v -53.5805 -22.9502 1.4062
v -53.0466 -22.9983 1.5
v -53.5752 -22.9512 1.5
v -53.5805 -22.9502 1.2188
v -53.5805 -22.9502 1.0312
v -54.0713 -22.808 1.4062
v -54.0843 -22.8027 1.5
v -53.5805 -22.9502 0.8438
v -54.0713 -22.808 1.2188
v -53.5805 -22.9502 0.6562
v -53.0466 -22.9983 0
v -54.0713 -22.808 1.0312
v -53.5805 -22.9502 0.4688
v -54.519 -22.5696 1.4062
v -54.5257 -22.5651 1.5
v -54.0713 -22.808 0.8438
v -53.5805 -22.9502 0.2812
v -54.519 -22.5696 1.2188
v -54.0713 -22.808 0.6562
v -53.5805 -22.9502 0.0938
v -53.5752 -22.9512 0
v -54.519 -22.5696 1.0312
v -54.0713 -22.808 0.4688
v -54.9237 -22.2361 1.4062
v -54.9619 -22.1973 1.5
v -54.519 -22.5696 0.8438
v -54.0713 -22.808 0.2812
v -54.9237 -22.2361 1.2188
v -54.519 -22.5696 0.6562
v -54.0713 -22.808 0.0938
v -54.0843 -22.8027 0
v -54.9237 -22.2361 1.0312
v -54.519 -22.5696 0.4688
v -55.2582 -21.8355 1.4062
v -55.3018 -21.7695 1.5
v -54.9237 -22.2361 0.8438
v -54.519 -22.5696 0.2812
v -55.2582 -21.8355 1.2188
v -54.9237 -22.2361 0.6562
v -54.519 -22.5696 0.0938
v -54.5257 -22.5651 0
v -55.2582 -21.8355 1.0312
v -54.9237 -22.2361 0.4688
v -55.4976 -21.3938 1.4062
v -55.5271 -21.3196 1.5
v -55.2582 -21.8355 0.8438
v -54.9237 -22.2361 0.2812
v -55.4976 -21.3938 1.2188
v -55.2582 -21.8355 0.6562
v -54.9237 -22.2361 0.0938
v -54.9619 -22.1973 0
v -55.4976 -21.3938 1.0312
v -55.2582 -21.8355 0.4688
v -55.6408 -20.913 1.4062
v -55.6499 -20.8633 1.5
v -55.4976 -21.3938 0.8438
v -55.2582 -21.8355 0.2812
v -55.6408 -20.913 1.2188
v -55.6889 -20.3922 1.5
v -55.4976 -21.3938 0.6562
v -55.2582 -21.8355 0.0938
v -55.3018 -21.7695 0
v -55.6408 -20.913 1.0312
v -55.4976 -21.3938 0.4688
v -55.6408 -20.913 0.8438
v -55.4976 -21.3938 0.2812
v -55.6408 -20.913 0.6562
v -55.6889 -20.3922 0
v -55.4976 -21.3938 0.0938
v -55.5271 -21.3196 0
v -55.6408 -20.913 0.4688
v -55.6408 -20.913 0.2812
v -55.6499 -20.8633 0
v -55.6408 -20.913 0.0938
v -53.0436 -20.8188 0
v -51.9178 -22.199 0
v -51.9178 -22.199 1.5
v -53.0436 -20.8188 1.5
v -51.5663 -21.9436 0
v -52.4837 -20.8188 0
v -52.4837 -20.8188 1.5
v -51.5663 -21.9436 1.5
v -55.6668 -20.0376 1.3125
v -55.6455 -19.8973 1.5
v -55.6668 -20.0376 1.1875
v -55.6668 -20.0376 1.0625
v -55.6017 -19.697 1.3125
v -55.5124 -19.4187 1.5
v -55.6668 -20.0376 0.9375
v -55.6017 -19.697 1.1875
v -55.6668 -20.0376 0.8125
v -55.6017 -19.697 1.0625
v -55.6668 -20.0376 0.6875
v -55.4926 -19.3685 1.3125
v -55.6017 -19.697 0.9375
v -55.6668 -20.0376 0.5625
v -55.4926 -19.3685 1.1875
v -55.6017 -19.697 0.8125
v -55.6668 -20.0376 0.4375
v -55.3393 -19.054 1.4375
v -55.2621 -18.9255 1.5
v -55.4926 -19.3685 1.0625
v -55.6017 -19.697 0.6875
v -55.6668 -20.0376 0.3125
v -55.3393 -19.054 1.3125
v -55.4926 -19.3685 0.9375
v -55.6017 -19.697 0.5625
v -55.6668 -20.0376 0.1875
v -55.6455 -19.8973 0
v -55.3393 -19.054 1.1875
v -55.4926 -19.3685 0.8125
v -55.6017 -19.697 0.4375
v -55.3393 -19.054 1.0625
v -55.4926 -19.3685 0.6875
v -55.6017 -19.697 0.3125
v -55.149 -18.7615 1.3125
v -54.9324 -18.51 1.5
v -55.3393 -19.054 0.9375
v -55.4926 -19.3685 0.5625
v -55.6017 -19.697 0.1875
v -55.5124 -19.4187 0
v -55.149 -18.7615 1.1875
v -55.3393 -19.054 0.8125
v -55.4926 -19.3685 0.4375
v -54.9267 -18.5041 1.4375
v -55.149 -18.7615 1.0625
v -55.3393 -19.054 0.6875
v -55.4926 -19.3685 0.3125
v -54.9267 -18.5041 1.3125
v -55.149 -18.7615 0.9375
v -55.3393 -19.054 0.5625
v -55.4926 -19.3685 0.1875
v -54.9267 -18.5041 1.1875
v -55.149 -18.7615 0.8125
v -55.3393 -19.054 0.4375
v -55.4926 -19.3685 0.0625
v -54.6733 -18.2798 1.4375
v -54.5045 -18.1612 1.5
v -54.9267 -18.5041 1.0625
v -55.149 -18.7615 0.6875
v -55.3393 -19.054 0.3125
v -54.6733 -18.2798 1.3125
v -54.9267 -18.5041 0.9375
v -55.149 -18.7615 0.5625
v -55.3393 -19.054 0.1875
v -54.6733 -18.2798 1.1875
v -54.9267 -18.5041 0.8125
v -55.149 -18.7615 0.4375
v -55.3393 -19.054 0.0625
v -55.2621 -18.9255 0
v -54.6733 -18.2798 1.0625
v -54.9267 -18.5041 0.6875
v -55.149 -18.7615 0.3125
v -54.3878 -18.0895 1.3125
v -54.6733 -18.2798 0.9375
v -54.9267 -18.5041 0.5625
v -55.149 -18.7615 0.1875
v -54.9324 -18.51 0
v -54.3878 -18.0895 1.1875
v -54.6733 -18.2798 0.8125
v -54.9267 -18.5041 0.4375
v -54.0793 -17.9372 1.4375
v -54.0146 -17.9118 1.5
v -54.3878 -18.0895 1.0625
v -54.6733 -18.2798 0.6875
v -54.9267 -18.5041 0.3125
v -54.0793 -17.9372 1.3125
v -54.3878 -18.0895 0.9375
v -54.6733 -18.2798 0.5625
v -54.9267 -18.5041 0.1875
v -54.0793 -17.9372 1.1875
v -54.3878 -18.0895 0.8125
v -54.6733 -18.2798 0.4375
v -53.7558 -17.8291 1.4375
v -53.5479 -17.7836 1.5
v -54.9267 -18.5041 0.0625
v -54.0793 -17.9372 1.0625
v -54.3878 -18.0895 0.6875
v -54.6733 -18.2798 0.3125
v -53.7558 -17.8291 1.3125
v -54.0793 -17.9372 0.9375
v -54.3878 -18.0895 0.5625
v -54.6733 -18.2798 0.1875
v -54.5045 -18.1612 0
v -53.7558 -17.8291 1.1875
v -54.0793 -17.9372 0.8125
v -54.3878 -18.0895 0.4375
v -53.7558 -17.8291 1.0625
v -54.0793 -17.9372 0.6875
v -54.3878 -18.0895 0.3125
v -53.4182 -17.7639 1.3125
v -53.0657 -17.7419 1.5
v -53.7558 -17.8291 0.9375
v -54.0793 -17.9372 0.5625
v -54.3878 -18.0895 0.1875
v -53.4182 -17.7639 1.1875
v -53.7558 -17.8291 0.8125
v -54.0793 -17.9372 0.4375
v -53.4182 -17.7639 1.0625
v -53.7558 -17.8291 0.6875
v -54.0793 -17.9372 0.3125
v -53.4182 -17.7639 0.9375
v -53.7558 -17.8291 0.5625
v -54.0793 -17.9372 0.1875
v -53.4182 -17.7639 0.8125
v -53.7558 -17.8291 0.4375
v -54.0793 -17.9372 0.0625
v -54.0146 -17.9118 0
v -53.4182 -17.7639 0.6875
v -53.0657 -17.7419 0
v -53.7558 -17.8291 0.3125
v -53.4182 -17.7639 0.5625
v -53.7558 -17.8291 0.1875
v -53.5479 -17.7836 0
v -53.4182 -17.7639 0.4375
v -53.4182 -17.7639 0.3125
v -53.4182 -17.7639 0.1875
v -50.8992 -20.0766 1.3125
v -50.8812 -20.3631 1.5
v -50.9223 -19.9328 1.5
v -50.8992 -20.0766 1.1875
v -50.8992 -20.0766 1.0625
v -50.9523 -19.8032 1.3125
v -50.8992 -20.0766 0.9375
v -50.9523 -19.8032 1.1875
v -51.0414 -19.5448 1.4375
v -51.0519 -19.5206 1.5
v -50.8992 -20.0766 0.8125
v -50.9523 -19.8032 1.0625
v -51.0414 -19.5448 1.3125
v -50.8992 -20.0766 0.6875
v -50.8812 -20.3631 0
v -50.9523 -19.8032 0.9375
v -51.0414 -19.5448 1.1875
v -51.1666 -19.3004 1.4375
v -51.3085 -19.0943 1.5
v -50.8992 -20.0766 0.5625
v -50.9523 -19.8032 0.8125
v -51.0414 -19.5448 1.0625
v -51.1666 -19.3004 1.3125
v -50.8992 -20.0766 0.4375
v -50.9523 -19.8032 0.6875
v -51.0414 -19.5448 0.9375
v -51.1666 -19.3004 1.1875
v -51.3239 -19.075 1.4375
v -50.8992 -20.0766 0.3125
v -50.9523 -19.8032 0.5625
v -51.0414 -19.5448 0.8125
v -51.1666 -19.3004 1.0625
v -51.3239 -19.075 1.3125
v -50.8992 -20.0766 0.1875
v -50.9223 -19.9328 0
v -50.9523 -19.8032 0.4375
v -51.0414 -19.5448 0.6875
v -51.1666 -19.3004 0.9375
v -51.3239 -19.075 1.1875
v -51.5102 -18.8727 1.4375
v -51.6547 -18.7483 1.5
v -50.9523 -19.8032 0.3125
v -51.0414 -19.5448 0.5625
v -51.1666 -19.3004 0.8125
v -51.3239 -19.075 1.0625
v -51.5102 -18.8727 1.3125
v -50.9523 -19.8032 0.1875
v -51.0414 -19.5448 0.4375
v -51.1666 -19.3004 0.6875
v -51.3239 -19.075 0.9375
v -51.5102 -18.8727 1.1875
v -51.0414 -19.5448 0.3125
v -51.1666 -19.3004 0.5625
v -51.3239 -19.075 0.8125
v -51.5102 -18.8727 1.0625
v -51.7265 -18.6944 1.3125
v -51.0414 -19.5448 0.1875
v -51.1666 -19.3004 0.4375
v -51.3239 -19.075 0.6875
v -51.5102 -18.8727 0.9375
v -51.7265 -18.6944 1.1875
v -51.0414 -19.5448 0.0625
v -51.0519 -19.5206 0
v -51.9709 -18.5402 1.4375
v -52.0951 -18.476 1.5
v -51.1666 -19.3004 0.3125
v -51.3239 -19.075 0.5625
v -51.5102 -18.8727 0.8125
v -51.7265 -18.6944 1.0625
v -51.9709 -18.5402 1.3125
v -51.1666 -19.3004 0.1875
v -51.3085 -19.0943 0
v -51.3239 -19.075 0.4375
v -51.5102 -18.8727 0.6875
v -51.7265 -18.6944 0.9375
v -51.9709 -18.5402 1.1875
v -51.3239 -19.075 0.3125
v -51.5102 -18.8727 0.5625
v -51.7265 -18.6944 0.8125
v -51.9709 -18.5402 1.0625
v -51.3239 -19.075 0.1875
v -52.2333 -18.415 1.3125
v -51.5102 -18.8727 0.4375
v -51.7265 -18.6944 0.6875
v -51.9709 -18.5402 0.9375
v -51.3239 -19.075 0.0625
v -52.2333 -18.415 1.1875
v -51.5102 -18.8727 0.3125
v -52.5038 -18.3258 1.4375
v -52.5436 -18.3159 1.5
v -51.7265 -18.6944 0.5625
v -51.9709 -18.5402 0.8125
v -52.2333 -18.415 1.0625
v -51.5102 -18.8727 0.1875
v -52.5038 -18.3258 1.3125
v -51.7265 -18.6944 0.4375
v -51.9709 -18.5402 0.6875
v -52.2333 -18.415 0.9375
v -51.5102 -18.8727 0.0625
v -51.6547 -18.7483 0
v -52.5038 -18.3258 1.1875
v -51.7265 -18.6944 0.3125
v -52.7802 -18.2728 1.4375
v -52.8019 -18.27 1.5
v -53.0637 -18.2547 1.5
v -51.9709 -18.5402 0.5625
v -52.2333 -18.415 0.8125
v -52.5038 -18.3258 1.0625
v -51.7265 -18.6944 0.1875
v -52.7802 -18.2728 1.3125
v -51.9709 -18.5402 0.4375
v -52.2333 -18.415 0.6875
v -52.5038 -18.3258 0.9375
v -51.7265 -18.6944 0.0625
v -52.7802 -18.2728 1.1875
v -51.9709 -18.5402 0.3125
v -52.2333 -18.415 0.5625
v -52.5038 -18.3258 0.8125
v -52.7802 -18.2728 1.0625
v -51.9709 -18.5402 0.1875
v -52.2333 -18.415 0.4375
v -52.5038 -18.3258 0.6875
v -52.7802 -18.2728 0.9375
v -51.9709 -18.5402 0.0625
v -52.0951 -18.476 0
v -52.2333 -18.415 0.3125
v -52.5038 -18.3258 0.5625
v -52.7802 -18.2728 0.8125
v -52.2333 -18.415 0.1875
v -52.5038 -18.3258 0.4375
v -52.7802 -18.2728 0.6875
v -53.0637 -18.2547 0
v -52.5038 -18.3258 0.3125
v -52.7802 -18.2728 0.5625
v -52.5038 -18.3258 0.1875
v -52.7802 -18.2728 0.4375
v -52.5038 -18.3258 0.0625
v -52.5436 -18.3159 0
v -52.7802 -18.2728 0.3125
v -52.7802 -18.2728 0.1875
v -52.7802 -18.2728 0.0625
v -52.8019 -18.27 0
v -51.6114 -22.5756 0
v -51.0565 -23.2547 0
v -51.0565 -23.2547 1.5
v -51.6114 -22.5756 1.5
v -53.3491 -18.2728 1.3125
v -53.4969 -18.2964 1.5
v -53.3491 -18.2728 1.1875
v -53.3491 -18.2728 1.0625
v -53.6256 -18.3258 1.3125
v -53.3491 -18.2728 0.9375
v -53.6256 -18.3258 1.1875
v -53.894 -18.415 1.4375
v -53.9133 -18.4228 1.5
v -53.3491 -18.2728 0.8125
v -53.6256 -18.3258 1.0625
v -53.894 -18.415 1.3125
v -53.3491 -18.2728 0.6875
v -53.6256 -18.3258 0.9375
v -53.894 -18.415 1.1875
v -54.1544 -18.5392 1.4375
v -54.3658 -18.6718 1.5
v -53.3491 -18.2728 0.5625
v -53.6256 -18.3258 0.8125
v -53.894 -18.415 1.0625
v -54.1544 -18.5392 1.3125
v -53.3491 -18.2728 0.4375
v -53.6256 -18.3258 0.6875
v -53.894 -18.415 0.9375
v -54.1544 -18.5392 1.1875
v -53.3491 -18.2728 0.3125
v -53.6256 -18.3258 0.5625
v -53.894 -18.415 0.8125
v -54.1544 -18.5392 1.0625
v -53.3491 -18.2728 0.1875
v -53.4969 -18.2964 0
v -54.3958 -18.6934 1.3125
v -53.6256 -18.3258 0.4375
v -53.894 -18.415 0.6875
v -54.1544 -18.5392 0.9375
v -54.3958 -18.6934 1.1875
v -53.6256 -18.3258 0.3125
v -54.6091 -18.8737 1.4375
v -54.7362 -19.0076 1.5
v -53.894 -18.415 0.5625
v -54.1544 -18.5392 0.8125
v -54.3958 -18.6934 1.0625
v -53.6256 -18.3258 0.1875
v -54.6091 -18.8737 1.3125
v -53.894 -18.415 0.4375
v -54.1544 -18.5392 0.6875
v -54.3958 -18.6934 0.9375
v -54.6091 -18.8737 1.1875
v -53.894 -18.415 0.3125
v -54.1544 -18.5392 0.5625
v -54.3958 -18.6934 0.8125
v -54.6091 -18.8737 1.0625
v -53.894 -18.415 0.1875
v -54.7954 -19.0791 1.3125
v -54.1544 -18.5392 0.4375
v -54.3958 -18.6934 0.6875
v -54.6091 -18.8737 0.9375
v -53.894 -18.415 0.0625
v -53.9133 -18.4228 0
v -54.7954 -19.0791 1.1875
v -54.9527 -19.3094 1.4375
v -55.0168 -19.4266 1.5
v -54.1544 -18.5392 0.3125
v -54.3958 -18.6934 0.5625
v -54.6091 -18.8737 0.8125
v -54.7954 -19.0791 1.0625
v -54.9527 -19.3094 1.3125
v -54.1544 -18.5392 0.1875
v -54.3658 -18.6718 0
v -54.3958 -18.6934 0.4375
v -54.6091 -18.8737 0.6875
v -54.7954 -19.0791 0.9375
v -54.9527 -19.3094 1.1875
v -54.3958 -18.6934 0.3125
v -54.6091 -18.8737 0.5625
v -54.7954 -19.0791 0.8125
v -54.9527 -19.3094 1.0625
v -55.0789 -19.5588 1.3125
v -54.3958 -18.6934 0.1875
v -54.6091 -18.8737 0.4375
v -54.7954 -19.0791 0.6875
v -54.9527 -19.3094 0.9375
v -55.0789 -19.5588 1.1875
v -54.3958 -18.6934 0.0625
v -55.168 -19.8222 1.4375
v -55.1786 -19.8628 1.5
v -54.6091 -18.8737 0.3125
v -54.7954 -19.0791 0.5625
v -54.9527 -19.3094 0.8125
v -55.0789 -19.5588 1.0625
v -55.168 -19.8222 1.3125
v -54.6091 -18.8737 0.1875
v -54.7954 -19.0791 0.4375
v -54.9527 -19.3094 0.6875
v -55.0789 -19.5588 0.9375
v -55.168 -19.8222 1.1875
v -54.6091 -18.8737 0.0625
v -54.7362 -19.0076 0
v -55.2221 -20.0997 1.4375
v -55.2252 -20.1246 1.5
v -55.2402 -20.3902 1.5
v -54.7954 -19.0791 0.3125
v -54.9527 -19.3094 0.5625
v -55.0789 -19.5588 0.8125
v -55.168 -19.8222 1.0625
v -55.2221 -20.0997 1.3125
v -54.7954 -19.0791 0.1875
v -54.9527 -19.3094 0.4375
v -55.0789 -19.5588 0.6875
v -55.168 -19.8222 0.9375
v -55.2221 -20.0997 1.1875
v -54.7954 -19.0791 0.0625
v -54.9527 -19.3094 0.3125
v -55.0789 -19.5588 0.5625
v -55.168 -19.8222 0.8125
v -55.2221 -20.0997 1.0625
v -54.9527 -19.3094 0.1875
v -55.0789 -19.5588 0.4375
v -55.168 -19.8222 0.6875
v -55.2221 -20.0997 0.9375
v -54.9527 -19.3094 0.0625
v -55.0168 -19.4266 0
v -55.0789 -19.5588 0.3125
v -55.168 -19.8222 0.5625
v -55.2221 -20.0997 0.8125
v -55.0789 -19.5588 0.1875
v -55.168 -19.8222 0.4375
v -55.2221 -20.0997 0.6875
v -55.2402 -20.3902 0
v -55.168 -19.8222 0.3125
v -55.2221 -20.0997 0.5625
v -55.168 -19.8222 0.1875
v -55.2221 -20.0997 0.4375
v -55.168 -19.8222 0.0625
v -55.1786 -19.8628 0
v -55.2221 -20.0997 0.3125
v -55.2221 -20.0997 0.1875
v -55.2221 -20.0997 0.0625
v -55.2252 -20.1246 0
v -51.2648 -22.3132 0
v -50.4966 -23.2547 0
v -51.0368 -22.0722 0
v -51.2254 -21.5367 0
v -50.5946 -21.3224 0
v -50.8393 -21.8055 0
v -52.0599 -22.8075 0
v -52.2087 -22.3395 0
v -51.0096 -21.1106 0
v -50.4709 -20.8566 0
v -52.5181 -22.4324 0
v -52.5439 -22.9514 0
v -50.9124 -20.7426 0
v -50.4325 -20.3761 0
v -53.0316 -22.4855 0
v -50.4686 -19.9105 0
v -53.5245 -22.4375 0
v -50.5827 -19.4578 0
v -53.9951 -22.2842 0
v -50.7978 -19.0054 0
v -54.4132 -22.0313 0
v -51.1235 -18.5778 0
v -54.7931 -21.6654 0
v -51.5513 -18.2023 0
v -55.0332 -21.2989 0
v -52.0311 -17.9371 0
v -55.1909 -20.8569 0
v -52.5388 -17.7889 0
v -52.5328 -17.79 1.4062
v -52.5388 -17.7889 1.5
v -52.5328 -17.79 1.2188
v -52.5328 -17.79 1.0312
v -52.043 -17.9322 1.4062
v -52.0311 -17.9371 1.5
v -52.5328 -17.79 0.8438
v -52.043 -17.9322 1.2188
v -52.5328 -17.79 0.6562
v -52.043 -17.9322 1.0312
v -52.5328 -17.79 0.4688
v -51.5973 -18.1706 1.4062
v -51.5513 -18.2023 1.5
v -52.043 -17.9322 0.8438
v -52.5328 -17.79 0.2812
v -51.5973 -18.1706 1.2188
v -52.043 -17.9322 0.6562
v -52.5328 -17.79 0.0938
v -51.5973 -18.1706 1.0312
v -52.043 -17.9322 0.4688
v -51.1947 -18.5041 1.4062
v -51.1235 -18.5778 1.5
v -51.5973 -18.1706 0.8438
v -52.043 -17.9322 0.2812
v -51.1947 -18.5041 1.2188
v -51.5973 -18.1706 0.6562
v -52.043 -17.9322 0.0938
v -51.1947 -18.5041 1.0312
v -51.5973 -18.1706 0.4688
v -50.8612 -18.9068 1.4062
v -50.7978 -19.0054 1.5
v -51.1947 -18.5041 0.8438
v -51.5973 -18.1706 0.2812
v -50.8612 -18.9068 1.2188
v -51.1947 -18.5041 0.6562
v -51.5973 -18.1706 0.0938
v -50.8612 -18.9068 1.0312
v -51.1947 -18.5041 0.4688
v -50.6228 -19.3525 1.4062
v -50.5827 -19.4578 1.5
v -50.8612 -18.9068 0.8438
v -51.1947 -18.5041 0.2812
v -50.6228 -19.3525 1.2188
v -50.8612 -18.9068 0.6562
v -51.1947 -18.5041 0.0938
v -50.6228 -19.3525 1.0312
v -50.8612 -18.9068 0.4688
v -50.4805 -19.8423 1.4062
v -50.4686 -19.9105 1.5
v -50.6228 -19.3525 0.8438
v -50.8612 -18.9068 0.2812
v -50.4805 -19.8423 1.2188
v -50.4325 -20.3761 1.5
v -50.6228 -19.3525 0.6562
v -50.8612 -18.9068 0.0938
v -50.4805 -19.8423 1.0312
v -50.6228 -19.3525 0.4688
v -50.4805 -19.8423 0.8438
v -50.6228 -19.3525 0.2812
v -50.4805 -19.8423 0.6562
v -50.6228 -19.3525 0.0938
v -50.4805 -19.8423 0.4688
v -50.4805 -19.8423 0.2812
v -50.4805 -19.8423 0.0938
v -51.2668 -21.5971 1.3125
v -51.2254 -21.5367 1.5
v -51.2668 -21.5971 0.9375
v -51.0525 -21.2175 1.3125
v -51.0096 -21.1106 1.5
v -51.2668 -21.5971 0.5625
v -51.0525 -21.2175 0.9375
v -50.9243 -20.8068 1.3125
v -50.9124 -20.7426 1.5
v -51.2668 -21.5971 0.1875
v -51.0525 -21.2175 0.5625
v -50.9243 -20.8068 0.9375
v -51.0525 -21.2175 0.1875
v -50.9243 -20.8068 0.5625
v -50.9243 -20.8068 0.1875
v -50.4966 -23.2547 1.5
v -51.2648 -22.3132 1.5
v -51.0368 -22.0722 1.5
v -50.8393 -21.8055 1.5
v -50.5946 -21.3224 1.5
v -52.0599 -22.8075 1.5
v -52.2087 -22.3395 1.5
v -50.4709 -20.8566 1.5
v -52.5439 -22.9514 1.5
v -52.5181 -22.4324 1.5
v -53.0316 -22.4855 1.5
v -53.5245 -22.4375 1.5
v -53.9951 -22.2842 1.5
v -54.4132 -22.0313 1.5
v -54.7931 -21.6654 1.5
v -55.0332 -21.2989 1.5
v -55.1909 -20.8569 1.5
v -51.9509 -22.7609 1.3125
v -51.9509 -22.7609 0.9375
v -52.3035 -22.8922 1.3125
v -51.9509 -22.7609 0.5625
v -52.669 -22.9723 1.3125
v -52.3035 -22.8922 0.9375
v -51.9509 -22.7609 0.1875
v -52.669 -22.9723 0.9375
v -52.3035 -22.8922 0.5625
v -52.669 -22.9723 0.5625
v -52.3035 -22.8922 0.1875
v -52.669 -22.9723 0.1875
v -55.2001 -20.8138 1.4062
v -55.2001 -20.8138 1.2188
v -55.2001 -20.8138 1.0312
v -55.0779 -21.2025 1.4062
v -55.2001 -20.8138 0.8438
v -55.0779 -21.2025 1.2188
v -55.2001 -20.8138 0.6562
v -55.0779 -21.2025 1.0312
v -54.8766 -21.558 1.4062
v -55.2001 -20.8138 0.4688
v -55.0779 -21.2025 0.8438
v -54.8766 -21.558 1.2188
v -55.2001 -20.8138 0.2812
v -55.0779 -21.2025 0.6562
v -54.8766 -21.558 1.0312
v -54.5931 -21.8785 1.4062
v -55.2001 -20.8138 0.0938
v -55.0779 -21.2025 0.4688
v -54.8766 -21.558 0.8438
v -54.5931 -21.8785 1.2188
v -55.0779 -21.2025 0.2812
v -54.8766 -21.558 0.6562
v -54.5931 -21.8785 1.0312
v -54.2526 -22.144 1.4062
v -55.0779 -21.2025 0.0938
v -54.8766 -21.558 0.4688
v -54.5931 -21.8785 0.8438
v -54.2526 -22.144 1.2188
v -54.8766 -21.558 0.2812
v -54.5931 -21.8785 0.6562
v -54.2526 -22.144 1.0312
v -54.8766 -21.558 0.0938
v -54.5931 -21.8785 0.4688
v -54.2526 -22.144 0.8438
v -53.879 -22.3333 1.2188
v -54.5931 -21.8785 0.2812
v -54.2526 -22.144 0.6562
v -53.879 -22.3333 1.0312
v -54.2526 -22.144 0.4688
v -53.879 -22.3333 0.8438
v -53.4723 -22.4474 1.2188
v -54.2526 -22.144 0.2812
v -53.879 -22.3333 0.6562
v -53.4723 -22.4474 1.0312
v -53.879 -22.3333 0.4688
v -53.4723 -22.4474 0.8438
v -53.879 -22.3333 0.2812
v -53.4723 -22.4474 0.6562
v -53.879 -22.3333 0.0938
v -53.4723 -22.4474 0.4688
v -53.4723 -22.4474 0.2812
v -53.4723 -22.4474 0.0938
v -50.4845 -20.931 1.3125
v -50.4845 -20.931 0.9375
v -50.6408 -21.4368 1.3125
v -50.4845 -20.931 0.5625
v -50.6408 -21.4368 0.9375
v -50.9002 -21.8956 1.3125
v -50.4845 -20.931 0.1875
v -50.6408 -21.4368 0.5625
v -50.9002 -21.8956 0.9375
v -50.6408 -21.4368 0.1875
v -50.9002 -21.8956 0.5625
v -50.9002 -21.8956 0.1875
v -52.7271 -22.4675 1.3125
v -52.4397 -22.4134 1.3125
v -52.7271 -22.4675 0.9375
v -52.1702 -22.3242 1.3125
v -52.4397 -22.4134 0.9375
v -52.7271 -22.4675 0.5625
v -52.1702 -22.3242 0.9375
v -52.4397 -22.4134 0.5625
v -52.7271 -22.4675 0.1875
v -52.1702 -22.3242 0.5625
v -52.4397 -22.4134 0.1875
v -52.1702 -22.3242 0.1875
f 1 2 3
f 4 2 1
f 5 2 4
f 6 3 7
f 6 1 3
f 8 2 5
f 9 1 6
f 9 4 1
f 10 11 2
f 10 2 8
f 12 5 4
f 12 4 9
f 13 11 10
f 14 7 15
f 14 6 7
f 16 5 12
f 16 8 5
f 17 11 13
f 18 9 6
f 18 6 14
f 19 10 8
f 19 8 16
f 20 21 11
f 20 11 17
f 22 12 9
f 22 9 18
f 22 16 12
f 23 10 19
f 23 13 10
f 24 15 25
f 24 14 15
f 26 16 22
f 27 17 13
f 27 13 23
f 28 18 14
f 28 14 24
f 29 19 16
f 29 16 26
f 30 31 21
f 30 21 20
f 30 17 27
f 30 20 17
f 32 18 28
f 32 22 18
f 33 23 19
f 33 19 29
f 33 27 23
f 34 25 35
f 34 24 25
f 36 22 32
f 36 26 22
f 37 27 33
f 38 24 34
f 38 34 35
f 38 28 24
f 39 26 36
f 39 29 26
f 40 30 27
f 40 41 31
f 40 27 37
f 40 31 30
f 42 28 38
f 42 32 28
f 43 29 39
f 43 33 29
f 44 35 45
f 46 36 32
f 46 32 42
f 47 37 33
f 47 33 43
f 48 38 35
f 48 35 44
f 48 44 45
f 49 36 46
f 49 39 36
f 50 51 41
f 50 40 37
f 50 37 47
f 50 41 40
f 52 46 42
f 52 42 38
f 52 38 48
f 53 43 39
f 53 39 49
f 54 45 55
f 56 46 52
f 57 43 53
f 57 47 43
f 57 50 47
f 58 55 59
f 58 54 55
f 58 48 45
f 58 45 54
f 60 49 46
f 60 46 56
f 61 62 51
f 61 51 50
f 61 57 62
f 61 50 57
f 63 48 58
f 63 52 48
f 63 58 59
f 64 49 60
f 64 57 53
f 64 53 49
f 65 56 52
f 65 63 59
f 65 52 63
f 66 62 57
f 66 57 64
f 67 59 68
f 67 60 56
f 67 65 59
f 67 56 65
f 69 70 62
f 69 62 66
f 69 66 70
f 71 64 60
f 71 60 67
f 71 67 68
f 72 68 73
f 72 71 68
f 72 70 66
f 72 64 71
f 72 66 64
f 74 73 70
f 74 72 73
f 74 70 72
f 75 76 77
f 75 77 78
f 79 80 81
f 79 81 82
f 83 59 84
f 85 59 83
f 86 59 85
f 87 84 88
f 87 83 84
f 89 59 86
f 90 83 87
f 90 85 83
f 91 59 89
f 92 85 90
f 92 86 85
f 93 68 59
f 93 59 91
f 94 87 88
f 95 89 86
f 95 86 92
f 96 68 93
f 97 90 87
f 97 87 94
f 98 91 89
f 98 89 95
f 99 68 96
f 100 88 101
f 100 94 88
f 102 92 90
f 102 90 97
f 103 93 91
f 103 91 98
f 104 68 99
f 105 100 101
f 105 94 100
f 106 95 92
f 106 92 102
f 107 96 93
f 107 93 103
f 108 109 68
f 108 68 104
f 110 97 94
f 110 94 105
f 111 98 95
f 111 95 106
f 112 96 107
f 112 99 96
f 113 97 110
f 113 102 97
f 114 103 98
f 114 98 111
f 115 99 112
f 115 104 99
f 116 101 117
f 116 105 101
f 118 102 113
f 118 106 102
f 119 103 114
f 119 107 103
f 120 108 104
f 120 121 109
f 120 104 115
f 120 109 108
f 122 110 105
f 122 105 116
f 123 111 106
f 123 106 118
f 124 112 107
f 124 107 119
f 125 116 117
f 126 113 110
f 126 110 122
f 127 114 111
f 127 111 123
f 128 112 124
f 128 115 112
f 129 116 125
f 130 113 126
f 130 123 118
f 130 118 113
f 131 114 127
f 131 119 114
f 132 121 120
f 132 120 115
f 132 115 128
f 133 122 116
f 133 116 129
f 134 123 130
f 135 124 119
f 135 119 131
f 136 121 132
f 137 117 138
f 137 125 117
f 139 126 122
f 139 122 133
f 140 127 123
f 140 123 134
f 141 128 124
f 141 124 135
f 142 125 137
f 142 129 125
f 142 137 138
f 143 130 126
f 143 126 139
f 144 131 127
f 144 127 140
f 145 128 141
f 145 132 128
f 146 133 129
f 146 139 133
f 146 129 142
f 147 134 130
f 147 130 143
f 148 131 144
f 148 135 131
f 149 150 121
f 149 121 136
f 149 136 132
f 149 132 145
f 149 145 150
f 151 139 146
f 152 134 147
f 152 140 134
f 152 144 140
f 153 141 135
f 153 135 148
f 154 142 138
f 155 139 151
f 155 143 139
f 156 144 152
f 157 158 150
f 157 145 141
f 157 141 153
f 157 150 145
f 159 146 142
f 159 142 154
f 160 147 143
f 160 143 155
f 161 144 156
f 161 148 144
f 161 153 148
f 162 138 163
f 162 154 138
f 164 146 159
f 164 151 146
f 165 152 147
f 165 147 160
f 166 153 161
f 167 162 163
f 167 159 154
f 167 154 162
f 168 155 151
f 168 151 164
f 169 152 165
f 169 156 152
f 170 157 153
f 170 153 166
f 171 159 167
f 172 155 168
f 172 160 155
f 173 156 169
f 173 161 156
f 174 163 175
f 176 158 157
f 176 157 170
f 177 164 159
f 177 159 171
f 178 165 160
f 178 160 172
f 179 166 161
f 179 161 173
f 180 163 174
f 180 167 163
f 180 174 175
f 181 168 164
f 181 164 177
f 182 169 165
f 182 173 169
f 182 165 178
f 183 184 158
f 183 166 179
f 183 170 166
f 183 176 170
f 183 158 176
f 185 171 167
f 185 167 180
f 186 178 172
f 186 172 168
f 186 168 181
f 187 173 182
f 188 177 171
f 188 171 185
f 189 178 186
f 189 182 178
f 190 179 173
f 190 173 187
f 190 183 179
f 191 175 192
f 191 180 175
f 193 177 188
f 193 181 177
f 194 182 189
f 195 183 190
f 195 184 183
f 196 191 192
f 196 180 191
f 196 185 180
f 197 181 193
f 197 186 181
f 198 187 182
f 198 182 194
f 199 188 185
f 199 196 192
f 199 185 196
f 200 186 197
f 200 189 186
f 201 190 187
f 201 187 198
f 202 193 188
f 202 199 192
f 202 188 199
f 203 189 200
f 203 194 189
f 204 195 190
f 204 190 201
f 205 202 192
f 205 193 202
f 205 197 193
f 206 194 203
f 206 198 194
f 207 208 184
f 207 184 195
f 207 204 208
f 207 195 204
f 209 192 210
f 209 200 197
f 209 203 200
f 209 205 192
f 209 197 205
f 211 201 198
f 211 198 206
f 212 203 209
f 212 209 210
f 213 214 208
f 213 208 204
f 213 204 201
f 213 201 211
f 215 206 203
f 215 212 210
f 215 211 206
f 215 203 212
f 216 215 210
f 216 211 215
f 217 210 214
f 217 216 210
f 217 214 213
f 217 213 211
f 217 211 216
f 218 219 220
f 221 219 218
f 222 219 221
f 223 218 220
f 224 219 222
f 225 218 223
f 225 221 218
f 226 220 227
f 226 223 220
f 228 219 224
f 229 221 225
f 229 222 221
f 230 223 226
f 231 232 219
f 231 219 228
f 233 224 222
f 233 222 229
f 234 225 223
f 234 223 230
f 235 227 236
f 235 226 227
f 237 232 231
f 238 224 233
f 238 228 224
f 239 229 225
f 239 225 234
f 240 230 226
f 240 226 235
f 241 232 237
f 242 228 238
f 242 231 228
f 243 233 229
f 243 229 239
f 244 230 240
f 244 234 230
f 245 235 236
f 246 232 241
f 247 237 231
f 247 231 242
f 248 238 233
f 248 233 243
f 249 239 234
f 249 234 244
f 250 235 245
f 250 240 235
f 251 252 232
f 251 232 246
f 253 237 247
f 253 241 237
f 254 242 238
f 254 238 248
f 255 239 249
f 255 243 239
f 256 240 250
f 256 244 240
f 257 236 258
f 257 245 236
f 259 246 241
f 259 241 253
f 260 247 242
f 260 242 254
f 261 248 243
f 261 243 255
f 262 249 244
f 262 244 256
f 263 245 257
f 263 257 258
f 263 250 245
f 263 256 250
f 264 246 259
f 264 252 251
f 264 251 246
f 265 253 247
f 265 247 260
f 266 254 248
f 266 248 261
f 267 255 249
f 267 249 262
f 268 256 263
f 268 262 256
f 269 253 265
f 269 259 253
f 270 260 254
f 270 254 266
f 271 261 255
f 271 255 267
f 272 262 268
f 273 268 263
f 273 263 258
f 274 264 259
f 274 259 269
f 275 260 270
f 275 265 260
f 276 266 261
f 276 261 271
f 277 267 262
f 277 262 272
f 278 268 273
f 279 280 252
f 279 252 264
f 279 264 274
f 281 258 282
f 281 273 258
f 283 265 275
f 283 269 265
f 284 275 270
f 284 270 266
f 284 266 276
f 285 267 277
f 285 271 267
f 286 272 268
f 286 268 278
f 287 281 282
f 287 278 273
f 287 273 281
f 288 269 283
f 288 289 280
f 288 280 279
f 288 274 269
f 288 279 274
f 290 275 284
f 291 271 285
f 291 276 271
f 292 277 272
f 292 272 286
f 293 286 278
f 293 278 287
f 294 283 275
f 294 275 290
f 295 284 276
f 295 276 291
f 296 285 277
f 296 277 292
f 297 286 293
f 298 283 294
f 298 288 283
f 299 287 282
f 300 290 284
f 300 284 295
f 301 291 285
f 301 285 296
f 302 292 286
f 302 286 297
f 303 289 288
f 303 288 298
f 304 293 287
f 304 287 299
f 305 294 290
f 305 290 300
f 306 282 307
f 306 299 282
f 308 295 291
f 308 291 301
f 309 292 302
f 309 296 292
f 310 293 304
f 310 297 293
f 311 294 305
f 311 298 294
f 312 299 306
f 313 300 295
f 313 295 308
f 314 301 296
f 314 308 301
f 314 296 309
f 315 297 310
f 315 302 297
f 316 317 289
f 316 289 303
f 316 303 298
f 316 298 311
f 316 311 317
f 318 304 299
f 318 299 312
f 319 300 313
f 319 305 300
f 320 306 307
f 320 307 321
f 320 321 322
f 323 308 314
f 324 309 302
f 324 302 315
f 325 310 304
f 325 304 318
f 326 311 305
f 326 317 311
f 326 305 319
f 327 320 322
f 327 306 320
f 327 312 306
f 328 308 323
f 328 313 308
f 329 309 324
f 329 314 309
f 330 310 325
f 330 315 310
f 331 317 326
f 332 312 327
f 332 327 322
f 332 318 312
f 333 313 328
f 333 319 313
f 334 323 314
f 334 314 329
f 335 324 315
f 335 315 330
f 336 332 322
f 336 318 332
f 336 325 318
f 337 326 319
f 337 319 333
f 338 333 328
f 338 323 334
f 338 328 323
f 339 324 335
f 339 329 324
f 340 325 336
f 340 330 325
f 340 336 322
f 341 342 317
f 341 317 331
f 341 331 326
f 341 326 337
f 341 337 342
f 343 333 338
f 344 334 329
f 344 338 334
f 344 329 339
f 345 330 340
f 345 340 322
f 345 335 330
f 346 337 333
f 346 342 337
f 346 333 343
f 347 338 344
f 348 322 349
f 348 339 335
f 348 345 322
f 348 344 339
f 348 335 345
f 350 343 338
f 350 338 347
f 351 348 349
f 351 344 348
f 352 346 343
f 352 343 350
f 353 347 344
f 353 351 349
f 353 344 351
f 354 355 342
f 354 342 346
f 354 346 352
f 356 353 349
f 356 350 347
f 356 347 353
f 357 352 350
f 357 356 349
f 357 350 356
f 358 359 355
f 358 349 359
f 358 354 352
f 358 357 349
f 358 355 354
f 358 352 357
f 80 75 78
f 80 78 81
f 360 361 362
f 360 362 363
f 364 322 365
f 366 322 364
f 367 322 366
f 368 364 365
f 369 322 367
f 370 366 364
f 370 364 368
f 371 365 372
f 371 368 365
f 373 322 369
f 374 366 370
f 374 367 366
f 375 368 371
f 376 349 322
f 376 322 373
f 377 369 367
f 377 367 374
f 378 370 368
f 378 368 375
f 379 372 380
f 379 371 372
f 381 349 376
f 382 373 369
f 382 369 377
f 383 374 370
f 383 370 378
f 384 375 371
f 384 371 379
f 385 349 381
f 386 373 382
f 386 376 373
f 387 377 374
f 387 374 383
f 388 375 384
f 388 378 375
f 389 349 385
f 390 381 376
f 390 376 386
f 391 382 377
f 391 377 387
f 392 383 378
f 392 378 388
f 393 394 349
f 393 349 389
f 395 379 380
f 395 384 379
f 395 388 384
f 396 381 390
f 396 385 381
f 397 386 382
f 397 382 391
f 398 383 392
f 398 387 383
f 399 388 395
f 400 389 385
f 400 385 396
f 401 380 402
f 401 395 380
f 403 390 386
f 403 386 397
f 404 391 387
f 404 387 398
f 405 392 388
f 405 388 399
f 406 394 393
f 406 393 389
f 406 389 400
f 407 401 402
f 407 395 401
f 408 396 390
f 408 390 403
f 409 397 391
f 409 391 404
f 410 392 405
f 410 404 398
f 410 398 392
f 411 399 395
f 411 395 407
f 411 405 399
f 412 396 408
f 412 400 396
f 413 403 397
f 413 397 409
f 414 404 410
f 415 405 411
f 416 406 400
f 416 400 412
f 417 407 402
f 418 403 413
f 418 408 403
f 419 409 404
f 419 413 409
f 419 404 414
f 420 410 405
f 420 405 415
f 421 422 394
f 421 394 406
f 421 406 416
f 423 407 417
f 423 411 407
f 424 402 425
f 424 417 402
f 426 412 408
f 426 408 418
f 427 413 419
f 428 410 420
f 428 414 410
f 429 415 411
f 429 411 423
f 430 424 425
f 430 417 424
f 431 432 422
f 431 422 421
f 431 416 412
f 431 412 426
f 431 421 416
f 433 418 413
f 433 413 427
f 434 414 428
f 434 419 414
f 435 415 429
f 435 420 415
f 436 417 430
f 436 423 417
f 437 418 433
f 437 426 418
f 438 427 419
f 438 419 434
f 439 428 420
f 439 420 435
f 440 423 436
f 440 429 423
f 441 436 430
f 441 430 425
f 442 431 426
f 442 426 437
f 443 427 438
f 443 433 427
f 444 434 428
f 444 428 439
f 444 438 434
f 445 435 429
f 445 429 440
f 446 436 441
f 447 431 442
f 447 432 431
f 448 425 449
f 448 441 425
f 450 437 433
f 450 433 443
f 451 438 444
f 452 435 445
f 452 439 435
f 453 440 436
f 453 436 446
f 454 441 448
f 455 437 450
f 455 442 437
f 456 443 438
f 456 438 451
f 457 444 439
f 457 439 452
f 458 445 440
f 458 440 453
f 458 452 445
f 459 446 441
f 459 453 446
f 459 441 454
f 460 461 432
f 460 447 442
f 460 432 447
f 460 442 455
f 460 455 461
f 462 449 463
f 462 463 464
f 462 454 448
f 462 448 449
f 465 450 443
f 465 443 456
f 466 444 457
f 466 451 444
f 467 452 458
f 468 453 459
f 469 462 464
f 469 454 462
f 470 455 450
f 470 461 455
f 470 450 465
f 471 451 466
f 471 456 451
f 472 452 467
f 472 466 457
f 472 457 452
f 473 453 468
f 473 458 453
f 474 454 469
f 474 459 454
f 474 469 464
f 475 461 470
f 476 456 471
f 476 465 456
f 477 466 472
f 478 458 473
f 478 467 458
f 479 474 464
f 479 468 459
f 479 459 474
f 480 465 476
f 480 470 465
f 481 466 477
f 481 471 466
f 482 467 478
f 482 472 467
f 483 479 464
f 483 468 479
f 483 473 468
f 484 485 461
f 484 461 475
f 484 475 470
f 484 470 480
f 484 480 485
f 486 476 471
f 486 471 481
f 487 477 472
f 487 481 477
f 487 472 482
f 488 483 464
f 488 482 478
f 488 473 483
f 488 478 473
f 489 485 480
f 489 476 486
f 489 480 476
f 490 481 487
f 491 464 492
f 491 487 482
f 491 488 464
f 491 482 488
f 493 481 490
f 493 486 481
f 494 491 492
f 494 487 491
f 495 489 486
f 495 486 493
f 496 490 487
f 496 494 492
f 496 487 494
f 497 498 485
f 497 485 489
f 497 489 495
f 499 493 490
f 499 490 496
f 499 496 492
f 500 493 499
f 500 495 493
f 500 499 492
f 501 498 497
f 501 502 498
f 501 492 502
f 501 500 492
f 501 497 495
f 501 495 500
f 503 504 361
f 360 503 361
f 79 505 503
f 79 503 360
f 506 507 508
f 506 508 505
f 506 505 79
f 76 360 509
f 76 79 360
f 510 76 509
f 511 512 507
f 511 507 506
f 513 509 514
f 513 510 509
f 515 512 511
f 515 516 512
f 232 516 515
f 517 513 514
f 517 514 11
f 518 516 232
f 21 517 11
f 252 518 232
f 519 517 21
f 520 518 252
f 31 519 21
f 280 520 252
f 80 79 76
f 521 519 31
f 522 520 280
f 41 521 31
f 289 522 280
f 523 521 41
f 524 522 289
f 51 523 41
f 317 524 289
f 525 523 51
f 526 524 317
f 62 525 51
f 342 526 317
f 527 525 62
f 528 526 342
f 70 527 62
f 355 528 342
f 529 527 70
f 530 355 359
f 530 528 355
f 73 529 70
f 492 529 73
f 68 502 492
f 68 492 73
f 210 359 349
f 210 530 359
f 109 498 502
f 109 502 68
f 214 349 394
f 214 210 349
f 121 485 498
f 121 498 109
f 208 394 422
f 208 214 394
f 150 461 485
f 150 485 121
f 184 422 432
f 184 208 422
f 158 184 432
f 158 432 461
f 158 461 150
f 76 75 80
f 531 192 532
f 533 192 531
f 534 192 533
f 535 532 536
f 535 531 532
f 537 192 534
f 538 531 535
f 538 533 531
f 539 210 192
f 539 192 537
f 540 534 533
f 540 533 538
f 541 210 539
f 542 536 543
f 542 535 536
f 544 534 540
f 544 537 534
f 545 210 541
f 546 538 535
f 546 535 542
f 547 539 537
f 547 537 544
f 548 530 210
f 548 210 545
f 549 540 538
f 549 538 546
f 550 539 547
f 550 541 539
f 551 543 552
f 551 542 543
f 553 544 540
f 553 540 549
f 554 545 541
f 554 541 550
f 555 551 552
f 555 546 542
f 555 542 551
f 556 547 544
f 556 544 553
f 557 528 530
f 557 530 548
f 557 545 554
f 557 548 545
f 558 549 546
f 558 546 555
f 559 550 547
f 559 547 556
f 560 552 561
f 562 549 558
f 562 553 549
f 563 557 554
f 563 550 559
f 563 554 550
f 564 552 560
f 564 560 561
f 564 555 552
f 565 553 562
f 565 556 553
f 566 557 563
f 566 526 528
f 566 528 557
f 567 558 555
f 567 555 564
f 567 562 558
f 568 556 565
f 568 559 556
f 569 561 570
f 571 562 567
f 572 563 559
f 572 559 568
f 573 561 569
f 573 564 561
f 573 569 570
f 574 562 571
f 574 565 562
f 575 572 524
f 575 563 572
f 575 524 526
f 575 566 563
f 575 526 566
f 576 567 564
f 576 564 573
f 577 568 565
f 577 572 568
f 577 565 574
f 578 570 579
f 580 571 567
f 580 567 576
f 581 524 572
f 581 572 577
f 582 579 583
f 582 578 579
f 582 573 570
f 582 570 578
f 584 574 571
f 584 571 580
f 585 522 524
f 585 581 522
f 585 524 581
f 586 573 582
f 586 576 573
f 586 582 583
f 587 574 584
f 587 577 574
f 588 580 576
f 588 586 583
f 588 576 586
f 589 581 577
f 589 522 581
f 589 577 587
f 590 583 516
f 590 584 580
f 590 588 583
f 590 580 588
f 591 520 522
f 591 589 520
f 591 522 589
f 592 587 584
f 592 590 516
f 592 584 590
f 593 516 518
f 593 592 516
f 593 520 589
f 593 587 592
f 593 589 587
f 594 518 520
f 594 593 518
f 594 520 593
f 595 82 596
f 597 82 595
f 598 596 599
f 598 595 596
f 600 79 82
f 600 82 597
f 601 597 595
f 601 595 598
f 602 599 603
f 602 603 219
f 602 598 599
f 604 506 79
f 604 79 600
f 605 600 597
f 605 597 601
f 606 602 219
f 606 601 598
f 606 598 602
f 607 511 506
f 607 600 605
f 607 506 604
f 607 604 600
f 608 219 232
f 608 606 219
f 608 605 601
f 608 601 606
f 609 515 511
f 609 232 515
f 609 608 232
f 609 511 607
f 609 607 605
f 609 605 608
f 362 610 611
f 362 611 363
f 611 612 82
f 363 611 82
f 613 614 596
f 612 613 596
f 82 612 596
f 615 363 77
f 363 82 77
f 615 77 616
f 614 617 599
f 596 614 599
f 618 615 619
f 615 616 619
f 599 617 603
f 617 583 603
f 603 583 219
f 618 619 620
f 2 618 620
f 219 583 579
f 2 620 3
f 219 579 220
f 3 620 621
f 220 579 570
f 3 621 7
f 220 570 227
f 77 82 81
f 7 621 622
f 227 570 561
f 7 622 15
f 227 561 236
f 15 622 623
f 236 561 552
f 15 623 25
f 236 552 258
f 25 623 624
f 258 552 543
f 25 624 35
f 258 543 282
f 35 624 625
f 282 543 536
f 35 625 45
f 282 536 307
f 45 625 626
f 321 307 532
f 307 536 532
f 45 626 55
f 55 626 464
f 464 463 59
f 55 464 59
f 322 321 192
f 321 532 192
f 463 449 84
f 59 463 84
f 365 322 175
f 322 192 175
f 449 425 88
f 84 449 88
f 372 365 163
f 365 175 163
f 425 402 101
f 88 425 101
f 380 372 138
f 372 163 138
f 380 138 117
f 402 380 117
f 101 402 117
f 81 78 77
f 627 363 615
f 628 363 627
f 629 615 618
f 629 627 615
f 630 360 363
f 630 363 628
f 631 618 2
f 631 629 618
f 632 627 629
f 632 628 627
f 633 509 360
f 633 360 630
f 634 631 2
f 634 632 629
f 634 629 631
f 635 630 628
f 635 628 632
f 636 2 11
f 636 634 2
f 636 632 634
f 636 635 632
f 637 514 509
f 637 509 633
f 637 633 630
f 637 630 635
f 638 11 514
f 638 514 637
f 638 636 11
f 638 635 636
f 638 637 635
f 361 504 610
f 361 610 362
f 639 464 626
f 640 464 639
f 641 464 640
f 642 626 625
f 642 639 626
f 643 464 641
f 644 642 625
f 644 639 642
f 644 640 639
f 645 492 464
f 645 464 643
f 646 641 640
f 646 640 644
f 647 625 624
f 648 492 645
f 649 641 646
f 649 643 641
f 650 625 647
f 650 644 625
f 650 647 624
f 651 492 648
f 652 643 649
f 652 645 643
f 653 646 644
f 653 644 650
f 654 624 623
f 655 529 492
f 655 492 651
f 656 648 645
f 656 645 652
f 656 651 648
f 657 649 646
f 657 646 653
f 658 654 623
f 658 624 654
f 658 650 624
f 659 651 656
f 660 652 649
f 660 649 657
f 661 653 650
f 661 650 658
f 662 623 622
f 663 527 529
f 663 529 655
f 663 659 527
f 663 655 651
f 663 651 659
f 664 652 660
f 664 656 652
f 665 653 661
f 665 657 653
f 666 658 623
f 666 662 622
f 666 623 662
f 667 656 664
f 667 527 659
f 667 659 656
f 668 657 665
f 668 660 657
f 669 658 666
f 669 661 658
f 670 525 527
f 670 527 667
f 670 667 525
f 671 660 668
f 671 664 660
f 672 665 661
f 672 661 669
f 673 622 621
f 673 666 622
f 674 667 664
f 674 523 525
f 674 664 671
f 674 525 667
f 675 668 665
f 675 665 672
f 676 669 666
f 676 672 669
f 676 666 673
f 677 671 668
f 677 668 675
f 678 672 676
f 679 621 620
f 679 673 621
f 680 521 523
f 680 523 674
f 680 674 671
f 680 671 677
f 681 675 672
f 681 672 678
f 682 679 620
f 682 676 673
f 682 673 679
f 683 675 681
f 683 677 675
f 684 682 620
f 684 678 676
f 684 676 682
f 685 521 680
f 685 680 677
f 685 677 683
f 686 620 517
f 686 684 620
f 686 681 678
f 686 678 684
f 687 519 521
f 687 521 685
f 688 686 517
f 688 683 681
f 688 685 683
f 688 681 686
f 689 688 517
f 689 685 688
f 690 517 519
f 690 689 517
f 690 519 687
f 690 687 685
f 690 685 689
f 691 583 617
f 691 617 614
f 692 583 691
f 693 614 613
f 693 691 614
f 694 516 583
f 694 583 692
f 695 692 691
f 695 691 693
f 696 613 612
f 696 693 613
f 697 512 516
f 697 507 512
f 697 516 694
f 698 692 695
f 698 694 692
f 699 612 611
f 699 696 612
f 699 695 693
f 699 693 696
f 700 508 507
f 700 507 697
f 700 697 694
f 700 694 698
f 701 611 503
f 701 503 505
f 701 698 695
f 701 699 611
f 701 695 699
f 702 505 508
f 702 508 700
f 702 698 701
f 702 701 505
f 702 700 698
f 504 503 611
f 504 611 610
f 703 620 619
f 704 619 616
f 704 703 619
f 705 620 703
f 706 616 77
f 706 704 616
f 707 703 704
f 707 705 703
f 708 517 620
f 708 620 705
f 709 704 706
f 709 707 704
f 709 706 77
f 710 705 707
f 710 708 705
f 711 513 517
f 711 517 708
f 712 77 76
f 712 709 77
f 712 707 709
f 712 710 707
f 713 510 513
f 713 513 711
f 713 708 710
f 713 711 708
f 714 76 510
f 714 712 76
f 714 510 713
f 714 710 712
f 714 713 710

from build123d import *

# Parameters (mm, degrees)
BOSS_EXTRU_1_DEPTH = 1.5


with BuildPart() as part:
    # Esquisse1 → Boss.-Extru.1 (new body)
    with BuildSketch(Plane.XY):
        with BuildLine():
            Line((-51.264797057, -22.313228051), (-50.49656789, -23.254734461))
            Line((-50.49656789, -23.254734461), (-51.056463723, -23.254734461))
            Line((-51.056463723, -23.254734461), (-51.611351544, -22.575647922))
            add(Edge.make_bspline(
                [(-51.611351544, -22.575647922), (-51.667004534, -22.609467545), (-51.77728534, -22.676483804), (-51.949237679, -22.762864043), (-52.124609537, -22.834743668), (-52.303012884, -22.894129346), (-52.484187867, -22.941664096), (-52.669053208, -22.974655224), (-52.856938413, -22.99381276), (-52.983170416, -22.996814657), (-53.046648018, -22.998324204)],
                knots=[0, 0, 0, 0, 1.030216282, 2.041455142, 3.041201647, 4.026904037, 5.014869161, 6.002481075, 6.995518502, 8, 8, 8, 8], degree=3))
            add(Edge.make_bspline(
                [(-53.046648018, -22.998324204), (-53.137591362, -22.99613371), (-53.316540791, -22.991823468), (-53.579355244, -22.954194244), (-53.831617557, -22.896079216), (-54.072824915, -22.811992553), (-54.303240075, -22.704589006), (-54.522755987, -22.572175755), (-54.731484222, -22.416586876), (-54.926343637, -22.238839192), (-55.104522805, -22.045474469), (-55.26086386, -21.838872985), (-55.393795998, -21.622463043), (-55.50127955, -21.395165474), (-55.586582113, -21.158959064), (-55.644713497, -20.911879357), (-55.682341265, -20.655397184), (-55.686676076, -20.480764083), (-55.688875582, -20.392154333)],
                knots=[0, 0, 0, 0, 1.055750571, 2.07740284, 3.077223765, 4.05828044, 5.038417088, 6.02463293, 7.030503776, 8.057169806, 9.083586829, 10.080154041, 11.061747002, 12.027853603, 12.995569715, 13.972756451, 14.971366004, 16, 16, 16, 16], degree=3))
            add(Edge.make_bspline(
                [(-55.688875582, -20.392154333), (-55.688093022, -20.33268107), (-55.686533398, -20.214152396), (-55.668491753, -20.038599293), (-55.641686338, -19.865936249), (-55.603771119, -19.696880782), (-55.554136935, -19.530739956), (-55.494630673, -19.367841379), (-55.422530915, -19.208604795), (-55.341023889, -19.053356113), (-55.250120175, -18.903440884), (-55.151096695, -18.7609928), (-55.043709844, -18.627415695), (-54.928035643, -18.502770687), (-54.804536059, -18.386782246), (-54.674273088, -18.277540391), (-54.534469264, -18.179109035), (-54.388814443, -18.087571822), (-54.236491808, -18.007077518), (-54.080480787, -17.935118183), (-53.919614333, -17.87673225), (-53.755979702, -17.826980362), (-53.588584139, -17.788997635), (-53.417558106, -17.762388722), (-53.243021921, -17.744173055), (-53.125153863, -17.742671581), (-53.065678467, -17.741913948)],
                knots=[0, 0, 0, 0, 1.030721839, 2.054201982, 3.056261636, 4.058906239, 5.055198403, 6.060579377, 7.06322398, 8.083343201, 9.098870418, 10.10084648, 11.0888991, 12.067804703, 13.046436456, 14.024708667, 15.012489976, 16.008294399, 17.005242112, 17.997338632, 18.984424362, 19.969624474, 20.960977749, 21.957320355, 22.969278161, 24, 24, 24, 24], degree=3))
            add(Edge.make_bspline(
                [(-53.065678467, -17.741913948), (-52.974734783, -17.744093445), (-52.796115568, -17.748374118), (-52.533952193, -17.786009017), (-52.282433034, -17.844357249), (-52.041737142, -17.928015386), (-51.812079117, -18.035689413), (-51.593555443, -18.168075975), (-51.385827324, -18.32367516), (-51.191986113, -18.501434748), (-51.014226591, -18.69527595), (-50.85862716, -18.903004041), (-50.726241492, -19.121527831), (-50.61856416, -19.35118542), (-50.534918456, -19.591882956), (-50.476447848, -19.843718418), (-50.438992649, -20.106242587), (-50.434664779, -20.285187594), (-50.432465326, -20.376128692)],
                knots=[0, 0, 0, 0, 1.050672203, 2.063587442, 3.054842799, 4.031180399, 5.003107577, 5.981273811, 6.979214548, 7.998088659, 9.016962771, 10.014903508, 10.993069742, 11.96499692, 12.941334519, 13.932589877, 14.949327797, 16, 16, 16, 16], degree=3))
            add(Edge.make_bspline(
                [(-50.432465326, -20.376128692), (-50.434869066, -20.4707535), (-50.439595885, -20.65682783), (-50.479821925, -20.929686009), (-50.544498334, -21.190329847), (-50.636217294, -21.438588569), (-50.754789182, -21.67441705), (-50.897923277, -21.9001736), (-51.067342928, -22.115842211), (-51.198285863, -22.24673986), (-51.264797057, -22.313228051)],
                knots=[0, 0, 0, 0, 1.045660934, 2.056233022, 3.041853582, 4.009978652, 4.97562384, 5.954545411, 6.961031197, 8, 8, 8, 8], degree=3))
        make_face()
        with BuildLine():
            add(Edge.make_bspline(
                [(-51.566279428, -21.943636704), (-51.51172417, -21.888232457), (-51.404411558, -21.779249846), (-51.265175554, -21.600524131), (-51.145418622, -21.41474237), (-51.049540161, -21.219433228), (-50.973255773, -21.017043638), (-50.92055164, -20.805969946), (-50.887551523, -20.587173057), (-50.883321632, -20.438345407), (-50.881183275, -20.363107858)],
                knots=[0, 0, 0, 0, 1.052210109, 2.069743939, 3.061837814, 4.040478349, 5.010453814, 5.985306305, 6.981502329, 8, 8, 8, 8], degree=3))
            add(Edge.make_bspline(
                [(-50.881183275, -20.363107858), (-50.881741995, -20.314655812), (-50.882846488, -20.218874654), (-50.898033237, -20.077135344), (-50.91951797, -19.93852653), (-50.950621278, -19.80329587), (-50.990674696, -19.671717346), (-51.040144187, -19.543969579), (-51.098065914, -19.419640443), (-51.165589992, -19.299502266), (-51.240029574, -19.183729173), (-51.322889962, -19.073737016), (-51.413004847, -18.970092944), (-51.509389767, -18.871088951), (-51.613903021, -18.778765875), (-51.726169785, -18.693163291), (-51.844806679, -18.61220964), (-51.970400768, -18.539138521), (-52.099825438, -18.471961029), (-52.232323378, -18.413789478), (-52.366782042, -18.364520258), (-52.502993214, -18.324569248), (-52.640780636, -18.293122716), (-52.780385877, -18.271662023), (-52.921447917, -18.256490913), (-53.016225731, -18.255320444), (-53.063675262, -18.254734461)],
                knots=[0, 0, 0, 0, 1.032958288, 2.041976502, 3.037103433, 4.023477888, 4.998866292, 5.968231228, 6.943073582, 7.921783703, 8.90545537, 9.876780072, 10.85618943, 11.833110341, 12.821898168, 13.827467856, 14.842673888, 15.88323808, 16.924703457, 17.951432745, 18.967462636, 19.976958182, 20.977218729, 21.979378626, 22.98839684, 24, 24, 24, 24], degree=3))
            add(Edge.make_bspline(
                [(-53.063675262, -18.254734461), (-53.111457778, -18.255324533), (-53.206900075, -18.256503161), (-53.348643141, -18.271578114), (-53.488568776, -18.293146341), (-53.626061561, -18.32443658), (-53.761608406, -18.364465284), (-53.894788585, -18.414032363), (-54.0267603, -18.470767101), (-54.154785018, -18.5379017), (-54.278638739, -18.61160116), (-54.396431464, -18.691749867), (-54.506548929, -18.779147467), (-54.610035703, -18.872386866), (-54.706633311, -18.972187476), (-54.796797838, -19.07788543), (-54.878945838, -19.190707144), (-54.954208859, -19.30863406), (-55.020729887, -19.431794307), (-55.080723414, -19.557965778), (-55.129451484, -19.688539497), (-55.169456196, -19.822470357), (-55.202146101, -19.959425394), (-55.223216014, -20.100199627), (-55.23851668, -20.243914258), (-55.239606438, -20.341030193), (-55.240157634, -20.390151128)],
                knots=[0, 0, 0, 0, 1.013205451, 2.023808328, 3.020541854, 4.015386314, 5.012622987, 6.016502547, 7.02834558, 8.057881235, 9.080621846, 10.084476421, 11.077781791, 12.060654405, 13.037357686, 14.022218736, 15.005346502, 15.995617173, 16.98763393, 17.973029642, 18.956998942, 19.940662314, 20.93709383, 21.940823471, 22.958474994, 24, 24, 24, 24], degree=3))
            add(Edge.make_bspline(
                [(-55.240157634, -20.390151128), (-55.238281124, -20.462369572), (-55.23458945, -20.604445595), (-55.203986388, -20.813037716), (-55.152676513, -21.012732702), (-55.080891868, -21.20381624), (-54.990776092, -21.3873897), (-54.87871031, -21.561654676), (-54.745172628, -21.725947416), (-54.595214832, -21.881396386), (-54.430259018, -22.022226929), (-54.255389856, -22.146173183), (-54.072100339, -22.251330598), (-53.879814905, -22.3362049), (-53.679967434, -22.404361837), (-53.470980336, -22.450505446), (-53.254219766, -22.48109067), (-53.106517754, -22.484018902), (-53.03162398, -22.485503692)],
                knots=[0, 0, 0, 0, 1.022526523, 2.011626, 2.97850031, 3.937665323, 4.897797383, 5.869804095, 6.865337375, 7.89202157, 8.925035373, 9.93268082, 10.923937058, 11.912550332, 12.905497077, 13.90928476, 14.939882052, 16, 16, 16, 16], degree=3))
            add(Edge.make_bspline(
                [(-53.03162398, -22.485503692), (-52.980169117, -22.484943162), (-52.878395032, -22.483834474), (-52.728317882, -22.468719305), (-52.581913274, -22.447444392), (-52.440536952, -22.415087335), (-52.302962964, -22.374860395), (-52.170010193, -22.325927955), (-52.040973375, -22.267918136), (-51.958926133, -22.222025542), (-51.917841928, -22.199045358)],
                knots=[0, 0, 0, 0, 1.060694673, 2.097979151, 3.107774411, 4.11000626, 5.086069662, 6.061987343, 7.029562652, 8, 8, 8, 8], degree=3))
            Line((-51.917841928, -22.199045358), (-53.04364321, -20.818837025))
            Line((-53.04364321, -20.818837025), (-52.483747377, -20.818837025))
            Line((-52.483747377, -20.818837025), (-51.566279428, -21.943636704))
        make_face(mode=Mode.SUBTRACT)
    extrude(amount=BOSS_EXTRU_1_DEPTH)


solid = part.part
